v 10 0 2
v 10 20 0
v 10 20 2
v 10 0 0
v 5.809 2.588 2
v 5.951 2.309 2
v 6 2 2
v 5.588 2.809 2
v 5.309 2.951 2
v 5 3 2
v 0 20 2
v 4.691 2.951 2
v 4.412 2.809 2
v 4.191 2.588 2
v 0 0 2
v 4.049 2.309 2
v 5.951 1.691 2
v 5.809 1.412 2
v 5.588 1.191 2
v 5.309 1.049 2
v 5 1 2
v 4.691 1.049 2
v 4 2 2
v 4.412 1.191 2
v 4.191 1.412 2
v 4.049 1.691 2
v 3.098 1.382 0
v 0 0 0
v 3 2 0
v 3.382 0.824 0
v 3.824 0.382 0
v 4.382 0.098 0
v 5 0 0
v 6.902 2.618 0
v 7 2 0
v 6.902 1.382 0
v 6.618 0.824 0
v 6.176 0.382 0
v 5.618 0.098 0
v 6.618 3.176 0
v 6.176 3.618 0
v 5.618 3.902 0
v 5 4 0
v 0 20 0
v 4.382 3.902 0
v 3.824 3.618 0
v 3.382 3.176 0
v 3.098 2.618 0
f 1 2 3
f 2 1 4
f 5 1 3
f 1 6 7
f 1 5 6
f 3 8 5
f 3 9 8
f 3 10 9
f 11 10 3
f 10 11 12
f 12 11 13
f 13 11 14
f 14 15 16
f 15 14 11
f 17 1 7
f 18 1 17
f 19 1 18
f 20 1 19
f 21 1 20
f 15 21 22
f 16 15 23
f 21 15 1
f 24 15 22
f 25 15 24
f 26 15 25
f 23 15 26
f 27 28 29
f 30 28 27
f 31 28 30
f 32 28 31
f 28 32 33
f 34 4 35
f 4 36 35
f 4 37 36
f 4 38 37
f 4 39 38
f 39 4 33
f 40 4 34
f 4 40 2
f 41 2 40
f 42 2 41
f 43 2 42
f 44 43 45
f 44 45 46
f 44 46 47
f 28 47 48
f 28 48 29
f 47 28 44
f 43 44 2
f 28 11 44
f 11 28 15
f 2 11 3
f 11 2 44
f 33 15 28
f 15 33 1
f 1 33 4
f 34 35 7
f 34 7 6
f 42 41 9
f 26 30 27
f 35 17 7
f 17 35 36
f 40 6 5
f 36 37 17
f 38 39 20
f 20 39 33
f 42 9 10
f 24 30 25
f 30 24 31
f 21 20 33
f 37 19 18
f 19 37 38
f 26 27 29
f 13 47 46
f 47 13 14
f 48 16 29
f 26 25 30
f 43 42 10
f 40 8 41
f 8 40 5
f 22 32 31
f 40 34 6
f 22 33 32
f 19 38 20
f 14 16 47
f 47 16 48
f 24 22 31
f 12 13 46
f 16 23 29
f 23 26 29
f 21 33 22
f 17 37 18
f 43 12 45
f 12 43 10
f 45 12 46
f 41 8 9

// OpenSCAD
$fn = 20;
difference() {
    cube([10,20,2]);
    translate([5, 2, 0]) {
        cylinder(2,2,1);
    }
}
